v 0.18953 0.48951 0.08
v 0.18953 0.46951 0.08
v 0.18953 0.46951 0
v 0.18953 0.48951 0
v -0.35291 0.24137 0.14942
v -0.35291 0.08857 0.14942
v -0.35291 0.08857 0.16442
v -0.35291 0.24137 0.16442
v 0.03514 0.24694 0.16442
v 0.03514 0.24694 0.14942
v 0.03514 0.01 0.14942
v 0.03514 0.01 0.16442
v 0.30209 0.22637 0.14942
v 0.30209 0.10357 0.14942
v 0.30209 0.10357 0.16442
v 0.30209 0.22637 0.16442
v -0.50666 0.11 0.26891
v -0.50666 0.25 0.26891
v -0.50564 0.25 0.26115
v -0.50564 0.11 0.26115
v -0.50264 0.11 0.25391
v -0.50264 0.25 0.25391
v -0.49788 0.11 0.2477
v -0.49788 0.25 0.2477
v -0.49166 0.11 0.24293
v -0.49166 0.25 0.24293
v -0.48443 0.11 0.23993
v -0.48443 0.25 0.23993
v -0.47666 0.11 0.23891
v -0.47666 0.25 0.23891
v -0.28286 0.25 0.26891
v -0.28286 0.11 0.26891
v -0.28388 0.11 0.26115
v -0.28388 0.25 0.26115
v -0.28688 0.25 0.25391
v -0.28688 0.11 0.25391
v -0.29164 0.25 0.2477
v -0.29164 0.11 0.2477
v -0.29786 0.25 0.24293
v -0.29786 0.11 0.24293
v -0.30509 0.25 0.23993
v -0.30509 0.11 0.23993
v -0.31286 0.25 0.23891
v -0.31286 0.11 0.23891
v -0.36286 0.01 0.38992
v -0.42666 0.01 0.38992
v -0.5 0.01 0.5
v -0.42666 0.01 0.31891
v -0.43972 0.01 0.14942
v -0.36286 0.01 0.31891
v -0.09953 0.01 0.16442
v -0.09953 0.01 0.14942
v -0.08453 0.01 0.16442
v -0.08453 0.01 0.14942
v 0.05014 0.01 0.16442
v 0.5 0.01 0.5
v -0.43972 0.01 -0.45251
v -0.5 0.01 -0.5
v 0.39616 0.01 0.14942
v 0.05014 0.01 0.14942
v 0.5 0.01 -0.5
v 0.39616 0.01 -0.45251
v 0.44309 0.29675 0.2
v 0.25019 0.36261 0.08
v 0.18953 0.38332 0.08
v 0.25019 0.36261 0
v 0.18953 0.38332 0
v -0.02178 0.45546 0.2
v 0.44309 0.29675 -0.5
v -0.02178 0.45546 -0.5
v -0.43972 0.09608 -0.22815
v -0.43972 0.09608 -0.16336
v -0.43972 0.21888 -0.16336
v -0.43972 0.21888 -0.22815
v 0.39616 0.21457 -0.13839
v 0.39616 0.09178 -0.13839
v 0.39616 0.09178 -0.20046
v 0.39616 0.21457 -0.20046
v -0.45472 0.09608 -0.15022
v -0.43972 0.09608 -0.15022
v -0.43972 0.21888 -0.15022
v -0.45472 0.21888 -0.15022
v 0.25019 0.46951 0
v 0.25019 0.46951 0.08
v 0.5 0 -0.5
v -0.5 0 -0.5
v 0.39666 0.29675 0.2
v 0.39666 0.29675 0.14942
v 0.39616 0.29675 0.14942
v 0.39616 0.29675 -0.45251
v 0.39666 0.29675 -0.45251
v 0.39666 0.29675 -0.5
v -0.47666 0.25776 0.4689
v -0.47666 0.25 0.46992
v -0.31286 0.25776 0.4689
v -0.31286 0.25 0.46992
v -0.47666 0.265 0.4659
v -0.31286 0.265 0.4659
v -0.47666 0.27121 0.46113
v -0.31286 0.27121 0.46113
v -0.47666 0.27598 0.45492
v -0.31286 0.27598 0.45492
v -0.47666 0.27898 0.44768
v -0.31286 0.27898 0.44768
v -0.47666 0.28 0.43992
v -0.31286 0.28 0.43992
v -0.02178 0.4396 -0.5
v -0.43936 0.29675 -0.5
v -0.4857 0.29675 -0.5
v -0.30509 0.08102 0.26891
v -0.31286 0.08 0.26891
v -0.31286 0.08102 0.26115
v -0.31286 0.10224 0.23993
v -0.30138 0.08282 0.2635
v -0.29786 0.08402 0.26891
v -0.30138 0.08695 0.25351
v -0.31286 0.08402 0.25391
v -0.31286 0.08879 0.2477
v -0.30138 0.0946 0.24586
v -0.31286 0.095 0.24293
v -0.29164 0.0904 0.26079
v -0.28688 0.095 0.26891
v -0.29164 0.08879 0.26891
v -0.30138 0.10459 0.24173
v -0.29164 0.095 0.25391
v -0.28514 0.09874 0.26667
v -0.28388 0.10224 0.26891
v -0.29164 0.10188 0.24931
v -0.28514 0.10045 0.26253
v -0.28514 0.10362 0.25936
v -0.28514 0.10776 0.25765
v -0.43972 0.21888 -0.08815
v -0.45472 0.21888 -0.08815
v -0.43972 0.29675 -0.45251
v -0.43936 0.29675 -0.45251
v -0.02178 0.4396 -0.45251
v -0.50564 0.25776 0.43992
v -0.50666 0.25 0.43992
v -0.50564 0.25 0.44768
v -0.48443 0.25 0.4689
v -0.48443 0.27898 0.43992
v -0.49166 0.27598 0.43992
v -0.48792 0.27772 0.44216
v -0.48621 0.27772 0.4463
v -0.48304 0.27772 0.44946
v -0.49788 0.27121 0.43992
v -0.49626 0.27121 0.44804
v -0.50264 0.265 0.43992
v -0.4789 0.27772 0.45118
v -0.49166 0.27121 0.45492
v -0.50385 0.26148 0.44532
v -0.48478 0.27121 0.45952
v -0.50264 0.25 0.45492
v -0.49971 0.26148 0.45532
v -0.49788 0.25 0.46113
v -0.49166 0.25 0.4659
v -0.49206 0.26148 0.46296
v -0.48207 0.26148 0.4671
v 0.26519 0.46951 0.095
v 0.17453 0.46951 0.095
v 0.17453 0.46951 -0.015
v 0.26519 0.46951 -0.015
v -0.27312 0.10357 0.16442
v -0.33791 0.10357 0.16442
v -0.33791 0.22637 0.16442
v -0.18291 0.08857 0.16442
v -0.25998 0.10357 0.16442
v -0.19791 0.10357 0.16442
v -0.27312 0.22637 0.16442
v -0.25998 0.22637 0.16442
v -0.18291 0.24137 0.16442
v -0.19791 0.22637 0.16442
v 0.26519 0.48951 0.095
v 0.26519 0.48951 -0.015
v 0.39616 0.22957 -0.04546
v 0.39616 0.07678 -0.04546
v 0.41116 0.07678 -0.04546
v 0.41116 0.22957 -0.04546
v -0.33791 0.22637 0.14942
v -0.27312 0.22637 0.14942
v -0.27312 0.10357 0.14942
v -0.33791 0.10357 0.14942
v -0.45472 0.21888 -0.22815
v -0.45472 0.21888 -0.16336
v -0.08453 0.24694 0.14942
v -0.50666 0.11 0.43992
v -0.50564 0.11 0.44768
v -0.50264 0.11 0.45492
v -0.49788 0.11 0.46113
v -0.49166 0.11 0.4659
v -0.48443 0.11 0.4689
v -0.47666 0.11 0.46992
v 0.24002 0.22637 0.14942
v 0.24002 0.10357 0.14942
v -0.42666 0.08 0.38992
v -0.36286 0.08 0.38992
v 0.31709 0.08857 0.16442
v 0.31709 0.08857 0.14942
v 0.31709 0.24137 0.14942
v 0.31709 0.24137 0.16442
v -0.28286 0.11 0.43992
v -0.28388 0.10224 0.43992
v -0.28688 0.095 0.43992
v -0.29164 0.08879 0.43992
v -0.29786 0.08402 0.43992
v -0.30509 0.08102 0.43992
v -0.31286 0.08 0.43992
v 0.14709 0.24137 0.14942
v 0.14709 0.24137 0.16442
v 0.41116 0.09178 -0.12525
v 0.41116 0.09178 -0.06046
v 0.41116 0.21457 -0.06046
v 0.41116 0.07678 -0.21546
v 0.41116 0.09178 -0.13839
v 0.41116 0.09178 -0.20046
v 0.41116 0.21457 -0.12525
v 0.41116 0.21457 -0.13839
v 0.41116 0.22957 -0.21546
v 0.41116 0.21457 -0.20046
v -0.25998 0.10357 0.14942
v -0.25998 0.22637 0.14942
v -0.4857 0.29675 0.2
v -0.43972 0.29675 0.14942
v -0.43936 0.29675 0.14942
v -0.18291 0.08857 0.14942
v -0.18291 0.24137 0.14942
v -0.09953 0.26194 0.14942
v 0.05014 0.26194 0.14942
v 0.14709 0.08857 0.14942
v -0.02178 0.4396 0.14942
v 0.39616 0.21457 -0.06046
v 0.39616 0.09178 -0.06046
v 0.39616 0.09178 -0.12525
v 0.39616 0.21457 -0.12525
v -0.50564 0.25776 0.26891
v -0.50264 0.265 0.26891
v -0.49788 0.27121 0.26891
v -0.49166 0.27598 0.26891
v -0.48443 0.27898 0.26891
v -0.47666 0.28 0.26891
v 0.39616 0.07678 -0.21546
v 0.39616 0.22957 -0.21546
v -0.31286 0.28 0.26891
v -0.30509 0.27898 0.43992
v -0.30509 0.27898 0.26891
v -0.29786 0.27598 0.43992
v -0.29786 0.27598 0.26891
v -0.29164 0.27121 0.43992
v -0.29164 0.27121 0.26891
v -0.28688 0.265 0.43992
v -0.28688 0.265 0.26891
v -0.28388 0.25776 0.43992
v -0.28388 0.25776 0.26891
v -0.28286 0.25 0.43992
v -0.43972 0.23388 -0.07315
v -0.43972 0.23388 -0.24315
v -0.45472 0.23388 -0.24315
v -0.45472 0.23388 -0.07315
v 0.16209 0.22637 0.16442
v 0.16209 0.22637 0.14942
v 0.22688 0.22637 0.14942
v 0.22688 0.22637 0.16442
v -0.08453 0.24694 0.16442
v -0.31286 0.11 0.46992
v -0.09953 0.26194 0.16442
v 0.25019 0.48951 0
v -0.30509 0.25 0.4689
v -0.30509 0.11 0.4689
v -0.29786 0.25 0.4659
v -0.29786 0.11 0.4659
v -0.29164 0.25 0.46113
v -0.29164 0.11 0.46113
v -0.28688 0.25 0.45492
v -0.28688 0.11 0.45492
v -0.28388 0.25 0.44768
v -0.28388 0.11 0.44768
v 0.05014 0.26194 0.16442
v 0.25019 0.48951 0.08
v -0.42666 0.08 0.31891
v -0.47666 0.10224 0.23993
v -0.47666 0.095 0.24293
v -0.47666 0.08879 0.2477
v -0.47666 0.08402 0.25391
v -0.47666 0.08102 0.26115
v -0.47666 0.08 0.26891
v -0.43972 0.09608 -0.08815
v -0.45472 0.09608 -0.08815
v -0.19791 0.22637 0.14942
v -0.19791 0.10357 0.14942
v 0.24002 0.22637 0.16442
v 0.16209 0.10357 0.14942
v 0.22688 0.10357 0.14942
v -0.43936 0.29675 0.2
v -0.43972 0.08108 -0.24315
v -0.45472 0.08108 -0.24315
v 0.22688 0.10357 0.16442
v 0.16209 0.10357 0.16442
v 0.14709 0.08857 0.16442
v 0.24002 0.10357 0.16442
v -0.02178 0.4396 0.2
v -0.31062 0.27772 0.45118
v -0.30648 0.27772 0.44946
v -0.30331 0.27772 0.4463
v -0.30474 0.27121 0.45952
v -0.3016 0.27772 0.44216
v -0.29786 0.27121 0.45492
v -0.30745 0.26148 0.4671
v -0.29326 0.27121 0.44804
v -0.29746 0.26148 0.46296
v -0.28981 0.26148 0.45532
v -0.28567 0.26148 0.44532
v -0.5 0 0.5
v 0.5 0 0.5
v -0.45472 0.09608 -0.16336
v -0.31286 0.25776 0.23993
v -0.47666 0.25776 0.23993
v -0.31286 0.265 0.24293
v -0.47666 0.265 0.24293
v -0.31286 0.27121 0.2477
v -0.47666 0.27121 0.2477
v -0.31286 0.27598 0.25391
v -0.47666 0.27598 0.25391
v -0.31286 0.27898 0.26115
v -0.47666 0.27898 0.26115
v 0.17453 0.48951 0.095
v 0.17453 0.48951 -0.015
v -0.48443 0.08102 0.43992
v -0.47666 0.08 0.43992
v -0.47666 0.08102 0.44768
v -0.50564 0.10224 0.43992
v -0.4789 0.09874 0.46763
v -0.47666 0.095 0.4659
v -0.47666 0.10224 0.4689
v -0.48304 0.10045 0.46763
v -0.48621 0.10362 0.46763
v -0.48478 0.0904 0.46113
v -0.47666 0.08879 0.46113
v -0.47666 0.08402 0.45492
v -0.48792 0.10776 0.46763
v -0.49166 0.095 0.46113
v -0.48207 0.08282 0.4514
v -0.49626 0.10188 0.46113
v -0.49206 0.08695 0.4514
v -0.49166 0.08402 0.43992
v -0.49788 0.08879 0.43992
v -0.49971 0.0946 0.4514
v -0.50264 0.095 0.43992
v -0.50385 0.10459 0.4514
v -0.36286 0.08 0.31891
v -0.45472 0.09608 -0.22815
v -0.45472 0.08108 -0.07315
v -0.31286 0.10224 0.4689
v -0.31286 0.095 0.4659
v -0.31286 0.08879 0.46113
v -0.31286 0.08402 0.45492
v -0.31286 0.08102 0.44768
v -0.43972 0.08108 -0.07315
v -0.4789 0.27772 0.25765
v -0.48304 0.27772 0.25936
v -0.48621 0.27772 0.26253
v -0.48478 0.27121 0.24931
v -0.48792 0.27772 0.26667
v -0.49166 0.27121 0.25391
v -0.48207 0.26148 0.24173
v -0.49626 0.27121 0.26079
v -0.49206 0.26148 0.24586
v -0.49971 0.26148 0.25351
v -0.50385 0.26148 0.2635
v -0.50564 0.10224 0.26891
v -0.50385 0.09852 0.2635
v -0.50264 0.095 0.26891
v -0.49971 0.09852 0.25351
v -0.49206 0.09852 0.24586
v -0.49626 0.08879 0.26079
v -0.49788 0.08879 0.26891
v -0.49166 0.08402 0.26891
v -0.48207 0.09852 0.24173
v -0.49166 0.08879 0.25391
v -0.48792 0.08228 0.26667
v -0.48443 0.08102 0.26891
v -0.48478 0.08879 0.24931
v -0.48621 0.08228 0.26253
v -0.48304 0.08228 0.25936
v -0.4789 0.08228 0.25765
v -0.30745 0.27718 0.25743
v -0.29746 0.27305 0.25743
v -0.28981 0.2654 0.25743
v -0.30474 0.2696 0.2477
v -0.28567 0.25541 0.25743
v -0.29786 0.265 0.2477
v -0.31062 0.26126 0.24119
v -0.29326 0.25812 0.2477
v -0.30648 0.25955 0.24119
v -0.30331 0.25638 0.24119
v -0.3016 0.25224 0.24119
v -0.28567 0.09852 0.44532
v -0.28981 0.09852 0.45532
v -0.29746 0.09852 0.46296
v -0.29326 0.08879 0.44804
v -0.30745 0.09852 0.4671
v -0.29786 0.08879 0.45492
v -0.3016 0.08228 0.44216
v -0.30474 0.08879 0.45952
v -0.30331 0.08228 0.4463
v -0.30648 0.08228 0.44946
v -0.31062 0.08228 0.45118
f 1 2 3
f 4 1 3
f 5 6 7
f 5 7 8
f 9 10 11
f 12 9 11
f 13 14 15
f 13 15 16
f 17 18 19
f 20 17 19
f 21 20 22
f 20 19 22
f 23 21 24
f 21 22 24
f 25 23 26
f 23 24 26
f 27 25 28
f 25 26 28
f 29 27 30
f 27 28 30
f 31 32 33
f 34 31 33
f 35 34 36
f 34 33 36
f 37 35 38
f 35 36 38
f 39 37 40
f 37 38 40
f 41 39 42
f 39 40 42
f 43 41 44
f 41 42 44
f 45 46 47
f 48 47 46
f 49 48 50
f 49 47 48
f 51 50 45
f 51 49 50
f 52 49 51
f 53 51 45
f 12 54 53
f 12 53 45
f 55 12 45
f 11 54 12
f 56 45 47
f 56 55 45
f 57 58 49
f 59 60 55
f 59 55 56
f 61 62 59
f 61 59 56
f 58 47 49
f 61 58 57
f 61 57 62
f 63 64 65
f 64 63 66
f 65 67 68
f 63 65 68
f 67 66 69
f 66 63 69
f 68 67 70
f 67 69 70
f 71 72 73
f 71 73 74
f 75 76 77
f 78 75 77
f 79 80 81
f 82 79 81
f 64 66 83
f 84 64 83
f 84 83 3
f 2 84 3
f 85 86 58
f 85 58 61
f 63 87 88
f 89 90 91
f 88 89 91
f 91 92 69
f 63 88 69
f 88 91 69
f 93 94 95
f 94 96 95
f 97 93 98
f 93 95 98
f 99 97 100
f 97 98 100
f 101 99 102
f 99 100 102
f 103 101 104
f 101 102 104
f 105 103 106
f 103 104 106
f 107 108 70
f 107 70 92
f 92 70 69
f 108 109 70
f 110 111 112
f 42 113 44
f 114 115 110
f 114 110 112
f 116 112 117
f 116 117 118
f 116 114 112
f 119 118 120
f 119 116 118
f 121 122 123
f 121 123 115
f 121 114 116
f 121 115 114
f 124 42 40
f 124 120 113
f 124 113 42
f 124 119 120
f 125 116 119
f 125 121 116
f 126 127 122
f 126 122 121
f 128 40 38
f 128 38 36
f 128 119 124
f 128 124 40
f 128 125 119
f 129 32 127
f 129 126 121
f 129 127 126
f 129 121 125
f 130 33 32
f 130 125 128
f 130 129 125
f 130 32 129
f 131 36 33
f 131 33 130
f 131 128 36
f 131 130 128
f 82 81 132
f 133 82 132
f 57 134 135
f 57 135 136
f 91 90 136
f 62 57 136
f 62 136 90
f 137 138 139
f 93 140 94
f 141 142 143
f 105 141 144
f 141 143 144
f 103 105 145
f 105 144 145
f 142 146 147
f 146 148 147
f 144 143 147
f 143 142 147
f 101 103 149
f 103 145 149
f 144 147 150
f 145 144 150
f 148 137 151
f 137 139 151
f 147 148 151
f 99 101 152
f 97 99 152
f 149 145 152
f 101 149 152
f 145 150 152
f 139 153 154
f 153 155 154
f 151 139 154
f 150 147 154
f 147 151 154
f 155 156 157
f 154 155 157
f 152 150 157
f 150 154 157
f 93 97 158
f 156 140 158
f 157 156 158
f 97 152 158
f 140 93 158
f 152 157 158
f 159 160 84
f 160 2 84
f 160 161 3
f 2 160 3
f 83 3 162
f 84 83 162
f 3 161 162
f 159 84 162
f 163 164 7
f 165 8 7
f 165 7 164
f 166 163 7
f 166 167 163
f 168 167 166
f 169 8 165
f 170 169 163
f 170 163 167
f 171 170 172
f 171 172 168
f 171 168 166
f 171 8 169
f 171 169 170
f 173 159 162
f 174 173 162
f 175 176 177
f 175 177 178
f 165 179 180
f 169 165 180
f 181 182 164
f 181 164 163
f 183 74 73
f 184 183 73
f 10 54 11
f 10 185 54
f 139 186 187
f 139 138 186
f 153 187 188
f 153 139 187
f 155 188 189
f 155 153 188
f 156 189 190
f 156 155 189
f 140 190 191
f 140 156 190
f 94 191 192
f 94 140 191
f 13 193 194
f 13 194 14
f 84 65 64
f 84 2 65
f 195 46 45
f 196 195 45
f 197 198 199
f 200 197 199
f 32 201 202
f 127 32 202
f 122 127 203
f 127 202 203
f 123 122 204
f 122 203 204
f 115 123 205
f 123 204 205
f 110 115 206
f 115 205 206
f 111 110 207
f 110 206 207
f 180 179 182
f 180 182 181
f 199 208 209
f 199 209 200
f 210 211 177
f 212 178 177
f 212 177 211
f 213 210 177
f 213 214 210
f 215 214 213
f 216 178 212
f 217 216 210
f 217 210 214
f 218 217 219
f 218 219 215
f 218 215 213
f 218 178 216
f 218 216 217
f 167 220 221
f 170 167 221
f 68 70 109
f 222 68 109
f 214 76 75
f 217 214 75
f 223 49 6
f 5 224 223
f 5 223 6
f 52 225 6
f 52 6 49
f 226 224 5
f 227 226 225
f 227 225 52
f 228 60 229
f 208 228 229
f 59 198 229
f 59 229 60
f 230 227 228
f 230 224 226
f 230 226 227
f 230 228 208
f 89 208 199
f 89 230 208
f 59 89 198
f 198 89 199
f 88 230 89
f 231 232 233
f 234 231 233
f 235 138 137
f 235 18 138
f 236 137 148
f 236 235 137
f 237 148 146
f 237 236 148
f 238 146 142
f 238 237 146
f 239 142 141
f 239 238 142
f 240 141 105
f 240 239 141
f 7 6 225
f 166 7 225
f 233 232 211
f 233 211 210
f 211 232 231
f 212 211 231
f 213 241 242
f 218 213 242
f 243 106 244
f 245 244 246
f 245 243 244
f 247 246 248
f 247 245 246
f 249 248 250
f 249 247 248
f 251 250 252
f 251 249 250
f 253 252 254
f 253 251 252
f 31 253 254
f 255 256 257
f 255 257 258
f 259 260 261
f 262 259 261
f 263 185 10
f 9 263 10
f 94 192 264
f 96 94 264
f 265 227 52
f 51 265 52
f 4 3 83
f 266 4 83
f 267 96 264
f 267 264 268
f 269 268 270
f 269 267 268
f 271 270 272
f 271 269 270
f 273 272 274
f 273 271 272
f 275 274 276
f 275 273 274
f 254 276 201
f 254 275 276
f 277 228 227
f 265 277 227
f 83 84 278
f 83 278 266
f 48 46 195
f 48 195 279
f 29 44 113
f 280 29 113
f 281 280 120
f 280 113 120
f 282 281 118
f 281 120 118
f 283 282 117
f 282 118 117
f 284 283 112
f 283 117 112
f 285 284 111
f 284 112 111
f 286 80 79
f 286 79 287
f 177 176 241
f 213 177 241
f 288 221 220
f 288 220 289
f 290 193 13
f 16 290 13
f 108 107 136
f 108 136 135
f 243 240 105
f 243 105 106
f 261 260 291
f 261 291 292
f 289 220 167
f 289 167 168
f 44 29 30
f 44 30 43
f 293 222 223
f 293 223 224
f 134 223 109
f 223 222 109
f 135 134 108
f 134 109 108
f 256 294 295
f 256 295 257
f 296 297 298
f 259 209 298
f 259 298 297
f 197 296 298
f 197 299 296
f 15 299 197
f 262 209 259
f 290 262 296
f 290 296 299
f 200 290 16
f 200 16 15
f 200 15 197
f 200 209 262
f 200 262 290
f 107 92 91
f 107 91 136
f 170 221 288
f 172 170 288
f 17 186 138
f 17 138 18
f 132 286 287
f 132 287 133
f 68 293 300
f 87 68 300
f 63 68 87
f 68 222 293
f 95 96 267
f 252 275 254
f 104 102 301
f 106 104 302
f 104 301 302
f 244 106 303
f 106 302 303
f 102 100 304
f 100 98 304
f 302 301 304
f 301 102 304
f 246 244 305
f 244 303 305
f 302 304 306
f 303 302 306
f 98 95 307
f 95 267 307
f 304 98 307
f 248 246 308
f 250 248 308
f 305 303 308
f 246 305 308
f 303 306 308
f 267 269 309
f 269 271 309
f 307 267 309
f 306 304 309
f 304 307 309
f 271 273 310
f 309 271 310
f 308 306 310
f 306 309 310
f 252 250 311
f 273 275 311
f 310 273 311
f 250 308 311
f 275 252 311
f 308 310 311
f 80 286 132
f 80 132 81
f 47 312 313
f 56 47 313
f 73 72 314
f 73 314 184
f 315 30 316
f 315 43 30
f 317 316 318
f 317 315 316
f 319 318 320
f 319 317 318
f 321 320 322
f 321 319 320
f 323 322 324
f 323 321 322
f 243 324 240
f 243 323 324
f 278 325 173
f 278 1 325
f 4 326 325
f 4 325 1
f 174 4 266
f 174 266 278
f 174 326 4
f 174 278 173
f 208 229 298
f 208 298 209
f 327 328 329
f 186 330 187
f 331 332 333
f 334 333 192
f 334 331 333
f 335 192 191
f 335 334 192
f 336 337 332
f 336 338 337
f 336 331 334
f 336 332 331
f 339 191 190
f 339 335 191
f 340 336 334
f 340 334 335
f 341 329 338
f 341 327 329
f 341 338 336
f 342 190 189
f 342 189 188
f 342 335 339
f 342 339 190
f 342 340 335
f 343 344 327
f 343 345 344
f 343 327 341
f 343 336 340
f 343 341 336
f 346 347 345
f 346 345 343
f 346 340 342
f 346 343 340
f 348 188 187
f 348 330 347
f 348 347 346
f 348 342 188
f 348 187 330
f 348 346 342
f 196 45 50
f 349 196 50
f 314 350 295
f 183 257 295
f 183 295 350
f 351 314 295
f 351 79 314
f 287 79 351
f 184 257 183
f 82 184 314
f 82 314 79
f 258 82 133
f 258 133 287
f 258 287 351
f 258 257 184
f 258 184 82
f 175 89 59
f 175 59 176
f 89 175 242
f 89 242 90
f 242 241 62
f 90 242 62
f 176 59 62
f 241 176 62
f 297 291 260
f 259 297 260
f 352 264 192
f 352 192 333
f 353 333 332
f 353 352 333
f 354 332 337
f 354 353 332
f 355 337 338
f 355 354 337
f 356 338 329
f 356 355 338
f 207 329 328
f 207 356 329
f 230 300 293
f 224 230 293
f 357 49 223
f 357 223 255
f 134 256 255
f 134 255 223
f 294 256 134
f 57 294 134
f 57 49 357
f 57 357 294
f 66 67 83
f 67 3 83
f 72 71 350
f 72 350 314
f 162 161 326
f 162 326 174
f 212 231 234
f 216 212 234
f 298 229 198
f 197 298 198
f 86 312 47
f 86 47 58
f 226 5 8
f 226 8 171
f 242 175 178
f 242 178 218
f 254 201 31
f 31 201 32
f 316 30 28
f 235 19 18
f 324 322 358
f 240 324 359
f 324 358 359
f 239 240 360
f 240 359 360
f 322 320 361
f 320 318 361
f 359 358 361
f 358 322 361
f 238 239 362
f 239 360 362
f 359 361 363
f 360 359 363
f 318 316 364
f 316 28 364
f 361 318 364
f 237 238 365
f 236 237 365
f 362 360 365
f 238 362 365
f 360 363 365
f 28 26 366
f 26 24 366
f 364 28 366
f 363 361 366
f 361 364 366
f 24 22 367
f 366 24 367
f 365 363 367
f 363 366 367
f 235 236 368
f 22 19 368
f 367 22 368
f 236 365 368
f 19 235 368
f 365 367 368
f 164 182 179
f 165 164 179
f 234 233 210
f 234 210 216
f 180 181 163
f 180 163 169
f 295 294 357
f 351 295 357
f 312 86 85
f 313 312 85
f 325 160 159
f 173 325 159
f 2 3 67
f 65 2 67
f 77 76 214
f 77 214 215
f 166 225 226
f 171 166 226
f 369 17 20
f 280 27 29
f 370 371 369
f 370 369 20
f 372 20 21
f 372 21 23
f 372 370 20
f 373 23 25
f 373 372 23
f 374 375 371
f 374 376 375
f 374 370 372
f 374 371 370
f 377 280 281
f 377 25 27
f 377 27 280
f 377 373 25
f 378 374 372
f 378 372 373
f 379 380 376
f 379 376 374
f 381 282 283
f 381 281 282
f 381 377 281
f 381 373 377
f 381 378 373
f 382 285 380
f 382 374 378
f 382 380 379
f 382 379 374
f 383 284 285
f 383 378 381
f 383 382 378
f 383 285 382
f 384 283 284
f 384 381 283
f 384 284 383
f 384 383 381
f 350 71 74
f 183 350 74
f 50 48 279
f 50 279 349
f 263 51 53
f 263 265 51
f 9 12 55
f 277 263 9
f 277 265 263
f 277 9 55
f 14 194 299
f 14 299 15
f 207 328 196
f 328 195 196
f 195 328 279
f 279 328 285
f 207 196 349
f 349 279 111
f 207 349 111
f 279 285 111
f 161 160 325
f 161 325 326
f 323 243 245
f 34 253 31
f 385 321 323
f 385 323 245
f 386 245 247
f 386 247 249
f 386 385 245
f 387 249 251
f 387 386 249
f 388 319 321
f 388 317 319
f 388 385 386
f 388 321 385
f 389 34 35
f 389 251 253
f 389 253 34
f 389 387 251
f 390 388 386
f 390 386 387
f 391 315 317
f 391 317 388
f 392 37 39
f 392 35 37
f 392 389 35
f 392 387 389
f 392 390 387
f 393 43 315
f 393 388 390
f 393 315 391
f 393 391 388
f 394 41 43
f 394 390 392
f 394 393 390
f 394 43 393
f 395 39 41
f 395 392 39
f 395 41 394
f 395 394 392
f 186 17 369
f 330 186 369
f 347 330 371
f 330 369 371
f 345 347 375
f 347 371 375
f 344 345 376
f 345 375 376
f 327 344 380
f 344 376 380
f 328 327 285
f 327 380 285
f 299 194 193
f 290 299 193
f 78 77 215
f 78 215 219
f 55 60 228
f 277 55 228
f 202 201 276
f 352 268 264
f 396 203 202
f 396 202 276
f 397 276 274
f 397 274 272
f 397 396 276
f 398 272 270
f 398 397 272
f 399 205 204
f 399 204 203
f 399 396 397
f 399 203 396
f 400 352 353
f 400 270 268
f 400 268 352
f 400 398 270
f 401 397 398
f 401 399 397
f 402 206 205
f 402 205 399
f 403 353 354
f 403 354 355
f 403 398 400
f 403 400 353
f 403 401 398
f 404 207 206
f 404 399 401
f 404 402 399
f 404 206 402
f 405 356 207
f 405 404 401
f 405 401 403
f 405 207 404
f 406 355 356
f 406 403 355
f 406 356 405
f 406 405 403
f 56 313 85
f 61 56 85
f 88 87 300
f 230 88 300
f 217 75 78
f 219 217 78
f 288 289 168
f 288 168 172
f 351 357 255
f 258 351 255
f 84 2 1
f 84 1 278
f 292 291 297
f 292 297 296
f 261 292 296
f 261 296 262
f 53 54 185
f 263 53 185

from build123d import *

# Parameters (mm, degrees)
ESBO_O1_W                     = 1
ESBO_O1_H                     = 1
RESSALTO_EXTRUS_O1_DEPTH      = 0.01
ESBO_O2_W                     = 0.835884883
ESBO_O2_H                     = 0.601923969
RESSALTO_EXTRUS_O3_DEPTH      = 0.3
RESSALTO_EXTRUS_O5_DEPTH      = 0.2
RESSALTO_EXTRUS_O5_DEPTH_BACK = 0.5
CORTE_EXTRUS_O2_DEPTH         = 0.050581546
CORTE_EXTRUS_O5_DEPTH         = 0.047494485
ESBO_O8_W                     = 0.17
ESBO_O8_H                     = 0.1527975
ESBO_O8_W_2                   = 0.064789378
ESBO_O8_H_2                   = 0.1227975
ESBO_O8_W_3                   = 0.0620701
RESSALTO_EXTRUS_O7_DEPTH      = 0.015
ESBO_O7_W                     = 0.17
ESBO_O7_H                     = 0.1527975
ESBO_O7_W_2                   = 0.064789378
ESBO_O7_H_2                   = 0.1227975
ESBO_O7_W_3                   = 0.0620701
RESSALTO_EXTRUS_O8_DEPTH      = 0.015
ESBO_O6_W                     = 0.17
ESBO_O6_H                     = 0.152797499
ESBO_O6_W_2                   = 0.0620701
ESBO_O6_H_2                   = 0.122797499
ESBO_O6_W_3                   = 0.064789378
RESSALTO_EXTRUS_O9_DEPTH      = 0.015
ESBO_O9_W                     = 0.063807516
ESBO_O9_H                     = 0.071007721
RESSALTO_EXTRUS_O10_DEPTH     = 0.07
ESBO_O11_W                    = 0.223807516
ESBO_O11_H                    = 0.231007721
RESSALTO_EXTRUS_O11_DEPTH     = 0.2
FILETE2_R                     = 0.03
FILETE3_R                     = 0.03
RESSALTO_EXTRUS_O12_DEPTH     = 0.08
ESBO_O13_W                    = 0.090661603
ESBO_O13_H                    = 0.11
ESBO_O13_W_2                  = 0.060661603
ESBO_O13_H_2                  = 0.08
RESSALTO_EXTRUS_O13_DEPTH     = 0.02


with BuildPart() as part:
    # Esboço1 → Ressalto-extrusão1 (new body)
    with BuildSketch(Plane(origin=(0, 0, 0), x_dir=(1, 0, 0), z_dir=(0, 1, 0))):
        Rectangle(ESBO_O1_W, ESBO_O1_H)
    extrude(amount=RESSALTO_EXTRUS_O1_DEPTH)

    # Esboço2 → Ressalto-extrusão3 (add)
    with BuildSketch(Plane(origin=(0, 0.01, 0), x_dir=(1, 0, 0), z_dir=(0, 1, 0))):
        with Locations((-0.021781552, 0.151543531)):
            Rectangle(ESBO_O2_W, ESBO_O2_H)
    extrude(amount=RESSALTO_EXTRUS_O3_DEPTH)

    # Esboço3 → Ressalto-extrusão5 (add, two sides: drawn at the far end of the back side and taken through both)
    with BuildSketch(Plane.XY.offset(-RESSALTO_EXTRUS_O5_DEPTH_BACK)):
        Polygon((-0.021781553, 0.455456142), (-0.485697767, 0.296752266), (0.443092699, 0.296752266), align=None)
    extrude(amount=RESSALTO_EXTRUS_O5_DEPTH + RESSALTO_EXTRUS_O5_DEPTH_BACK)

    # Esboço4 → Corte-extrusão2 (cut)
    with BuildSketch(Plane.XY.offset(0.2)):
        Polygon((-0.439355675, 0.296752266), (0.396664924, 0.296752266), (-0.021776549, 0.43960441), align=None)
    extrude(amount=-CORTE_EXTRUS_O2_DEPTH, mode=Mode.SUBTRACT)

    # Esboço5 → Corte-extrusão5 (cut)
    with BuildSketch(Plane(origin=(0, 0, -0.5), x_dir=(-1, 0, 0), z_dir=(0, 0, -1))):
        Polygon((0.471154082, 0.285874159), (-0.423424888, 0.287616656), (0.021776549, 0.43960441), align=None)
    extrude(amount=-CORTE_EXTRUS_O5_DEPTH, mode=Mode.SUBTRACT)

    # Esboço8 → Ressalto-extrusão7 (add)
    with BuildSketch(Plane(origin=(0.396160889, 0, 0), x_dir=(0, 0, -1), z_dir=(1, 0, 0))):
        with Locations((0.130456206, 0.153176171)):
            Rectangle(ESBO_O8_W, ESBO_O8_H)
        with Locations((0.092850895, 0.153176171)):
            Rectangle(ESBO_O8_W_2, ESBO_O8_H_2, mode=Mode.SUBTRACT)
        with Locations((0.169421156, 0.153176171)):
            Rectangle(ESBO_O8_W_3, ESBO_O8_H_2, mode=Mode.SUBTRACT)
    extrude(amount=RESSALTO_EXTRUS_O7_DEPTH)

    # Esboço7 → Ressalto-extrusão8 (add)
    with BuildSketch(Plane.ZY.offset(0.439723994)):
        with Locations((-0.158153325, 0.157477131)):
            Rectangle(ESBO_O7_W, ESBO_O7_H)
        with Locations((-0.195758636, 0.157477131)):
            Rectangle(ESBO_O7_W_2, ESBO_O7_H_2, mode=Mode.SUBTRACT)
        with Locations((-0.119188375, 0.157477131)):
            Rectangle(ESBO_O7_W_3, ESBO_O7_H_2, mode=Mode.SUBTRACT)
    extrude(amount=RESSALTO_EXTRUS_O8_DEPTH)

    # Esboço6 → Ressalto-extrusão9 (add)
    # profile 1 of 3: a face of its own
    with BuildSketch(Plane.XY.offset(0.149418454)):
        Polygon((-0.099530915, 0.01), (-0.084530915, 0.01), (-0.084530915, 0.246938695), (0.035135203, 0.246938695), (0.035135203, 0.01), (0.050135203, 0.01), (0.050135203, 0.261938695), (-0.099530915, 0.261938695), align=None)
    # profile 2 of 3: a face of its own
    with BuildSketch(Plane.XY.offset(0.149418454)):
        with Locations((-0.267908896, 0.164969523)):
            Rectangle(ESBO_O6_W, ESBO_O6_H)
        with Locations((-0.228943946, 0.164969523)):
            Rectangle(ESBO_O6_W_2, ESBO_O6_H_2, mode=Mode.SUBTRACT)
        with Locations((-0.305514207, 0.164969523)):
            Rectangle(ESBO_O6_W_3, ESBO_O6_H_2, mode=Mode.SUBTRACT)
    # profile 3 of 3: a face of its own
    with BuildSketch(Plane.XY.offset(0.149418454)):
        with Locations((0.232091104, 0.164969523)):
            Rectangle(ESBO_O6_W, ESBO_O6_H)
        with Locations((0.271056054, 0.164969523)):
            Rectangle(ESBO_O6_W_2, ESBO_O6_H_2, mode=Mode.SUBTRACT)
        with Locations((0.194485793, 0.164969523)):
            Rectangle(ESBO_O6_W_3, ESBO_O6_H_2, mode=Mode.SUBTRACT)
    extrude(amount=RESSALTO_EXTRUS_O9_DEPTH)

    # Esboço9 → Ressalto-extrusão10 (add)
    with BuildSketch(Plane(origin=(0, 0.01, 0), x_dir=(1, 0, 0), z_dir=(0, 1, 0))):
        with Locations((-0.394760136, -0.354413696)):
            Rectangle(ESBO_O9_W, ESBO_O9_H)
    extrude(amount=RESSALTO_EXTRUS_O10_DEPTH)

    # Esboço11 → Ressalto-extrusão11 (add)
    with BuildSketch(Plane(origin=(0, 0.08, 0), x_dir=(1, 0, 0), z_dir=(0, 1, 0))):
        with Locations((-0.394760136, -0.354413696)):
            Rectangle(ESBO_O11_W, ESBO_O11_H)
    extrude(amount=RESSALTO_EXTRUS_O11_DEPTH)

    # Filete2
    filete2_edges = [part.edges().sort_by_distance(p)[0] for p in [
        (-0.506663894, 0.08, 0.354413695),
        (-0.506663894, 0.18, 0.238909835),
        (-0.394760136, 0.08, 0.469917556),
        (-0.506663894, 0.18, 0.469917556),
        (-0.282856378, 0.18, 0.469917556),
        (-0.394760136, 0.28, 0.238909835),
        (-0.506663894, 0.28, 0.354413695),
        (-0.394760136, 0.28, 0.469917556),
        (-0.282856378, 0.28, 0.354413695),
    ]]
    fillet(filete2_edges, radius=FILETE2_R)

    # Filete3
    # the kernel refuses this fillet: 0.03 mm, written as the material it takes off along each edge
    with BuildSketch(Plane(origin=(-0.476663894, 0.11, 0.268909835), x_dir=(0, 0, -1), z_dir=(0, -1, 0))) as filete3_piece_1_section:
        Polygon((0, 0), (FILETE3_R, 0), (FILETE3_R, -FILETE3_R), (0, -FILETE3_R), align=None)
    filete3_piece_1 = extrude(amount=FILETE3_R, mode=Mode.PRIVATE)
    filete3_piece_1 = filete3_piece_1 - Plane(origin=(-0.476663894, 0.11, 0.268909835), x_dir=(0.7071067811865475, 0, 0.7071067811865475), z_dir=(0, -1, 0)) * Sphere(FILETE3_R, mode=Mode.PRIVATE)
    add(filete3_piece_1, mode=Mode.SUBTRACT)
    with BuildSketch(Plane(origin=(-0.312856378, 0.25, 0.268909835), x_dir=(1, 0, 0), z_dir=(0, 0, -1))) as filete3_piece_2_section:
        Polygon((0, 0), (FILETE3_R, 0), (FILETE3_R, -FILETE3_R), (0, -FILETE3_R), align=None)
    filete3_piece_2 = extrude(amount=FILETE3_R, mode=Mode.PRIVATE)
    filete3_piece_2 = filete3_piece_2 - Plane(origin=(-0.312856378, 0.25, 0.268909835), x_dir=(-0.7071067811865475, -0.7071067811865475, 0), z_dir=(0, 0, -1)) * Sphere(FILETE3_R, mode=Mode.PRIVATE)
    add(filete3_piece_2, mode=Mode.SUBTRACT)
    with BuildSketch(Plane(origin=(-0.312856378, 0.11, 0.439917556), x_dir=(1, 0, 0), z_dir=(0, -1, 0))) as filete3_piece_3_section:
        Polygon((0, 0), (FILETE3_R, 0), (FILETE3_R, FILETE3_R), (0, FILETE3_R), align=None)
    filete3_piece_3 = extrude(amount=FILETE3_R, mode=Mode.PRIVATE)
    filete3_piece_3 = filete3_piece_3 - Plane(origin=(-0.312856378, 0.11, 0.439917556), x_dir=(-0.7071067811865475, 0, -0.7071067811865475), z_dir=(0, -1, 0)) * Sphere(FILETE3_R, mode=Mode.PRIVATE)
    add(filete3_piece_3, mode=Mode.SUBTRACT)
    with BuildSketch(Plane(origin=(-0.312856378, 0.11, 0.268909835), x_dir=(0, -1, 0), z_dir=(1, 0, 0))) as filete3_piece_4_section:
        Polygon((0, 0), (FILETE3_R, 0), (FILETE3_R, FILETE3_R), (0, FILETE3_R), align=None)
    filete3_piece_4 = extrude(amount=FILETE3_R, mode=Mode.PRIVATE)
    filete3_piece_4 = filete3_piece_4 - Plane(origin=(-0.312856378, 0.11, 0.268909835), x_dir=(0, 0.7071067811865475, 0.7071067811865475), z_dir=(1, 0, 0)) * Sphere(FILETE3_R, mode=Mode.PRIVATE)
    add(filete3_piece_4, mode=Mode.SUBTRACT)
    with BuildSketch(Plane(origin=(-0.312856378, 0.08, 0.238909835), x_dir=(0, 0, 1), z_dir=(-1, 0, 0))) as filete3_piece_5:
        with BuildLine():
            CenterArc((FILETE3_R, FILETE3_R), FILETE3_R, 180, 90)
            Line((0, FILETE3_R), (0, 0))
            Line((0, 0), (FILETE3_R, 0))
        make_face()
    extrude(amount=0.163807516, mode=Mode.SUBTRACT)
    with BuildSketch(Plane(origin=(-0.282856378, 0.08, 0.439917556), x_dir=(-1, 0, 0), z_dir=(0, 0, -1))) as filete3_piece_6:
        with BuildLine():
            CenterArc((FILETE3_R, FILETE3_R), FILETE3_R, 180, 90)
            Line((0, FILETE3_R), (0, 0))
            Line((0, 0), (FILETE3_R, 0))
        make_face()
    extrude(amount=0.171007722, mode=Mode.SUBTRACT)
    with BuildSketch(Plane(origin=(-0.282856378, 0.11, 0.238909835), x_dir=(-1, 0, 0), z_dir=(0, 1, 0))) as filete3_piece_7:
        with BuildLine():
            CenterArc((FILETE3_R, FILETE3_R), FILETE3_R, 180, 90)
            Line((0, FILETE3_R), (0, 0))
            Line((0, 0), (FILETE3_R, 0))
        make_face()
    extrude(amount=0.14, mode=Mode.SUBTRACT)

    # Esboço12 → Ressalto-extrusão12 (add)
    with BuildSketch(Plane.XY):
        Polygon((0.189525463, 0.383317833), (0.250187066, 0.362608509), (0.250187066, 0.469514712), (0.189525463, 0.469514712), align=None)
    extrude(amount=RESSALTO_EXTRUS_O12_DEPTH)


with BuildPart() as body_2:
    # Esboço13 → Ressalto-extrusão13 (new body)
    with BuildSketch(Plane(origin=(0, 0.469514712, 0), x_dir=(1, 0, 0), z_dir=(0, 1, 0))):
        with Locations((0.219856265, -0.04)):
            Rectangle(ESBO_O13_W, ESBO_O13_H)
        with Locations((0.219856265, -0.04)):
            Rectangle(ESBO_O13_W_2, ESBO_O13_H_2, mode=Mode.SUBTRACT)
    extrude(amount=RESSALTO_EXTRUS_O13_DEPTH)


solid = Compound([part.part, body_2.part])
